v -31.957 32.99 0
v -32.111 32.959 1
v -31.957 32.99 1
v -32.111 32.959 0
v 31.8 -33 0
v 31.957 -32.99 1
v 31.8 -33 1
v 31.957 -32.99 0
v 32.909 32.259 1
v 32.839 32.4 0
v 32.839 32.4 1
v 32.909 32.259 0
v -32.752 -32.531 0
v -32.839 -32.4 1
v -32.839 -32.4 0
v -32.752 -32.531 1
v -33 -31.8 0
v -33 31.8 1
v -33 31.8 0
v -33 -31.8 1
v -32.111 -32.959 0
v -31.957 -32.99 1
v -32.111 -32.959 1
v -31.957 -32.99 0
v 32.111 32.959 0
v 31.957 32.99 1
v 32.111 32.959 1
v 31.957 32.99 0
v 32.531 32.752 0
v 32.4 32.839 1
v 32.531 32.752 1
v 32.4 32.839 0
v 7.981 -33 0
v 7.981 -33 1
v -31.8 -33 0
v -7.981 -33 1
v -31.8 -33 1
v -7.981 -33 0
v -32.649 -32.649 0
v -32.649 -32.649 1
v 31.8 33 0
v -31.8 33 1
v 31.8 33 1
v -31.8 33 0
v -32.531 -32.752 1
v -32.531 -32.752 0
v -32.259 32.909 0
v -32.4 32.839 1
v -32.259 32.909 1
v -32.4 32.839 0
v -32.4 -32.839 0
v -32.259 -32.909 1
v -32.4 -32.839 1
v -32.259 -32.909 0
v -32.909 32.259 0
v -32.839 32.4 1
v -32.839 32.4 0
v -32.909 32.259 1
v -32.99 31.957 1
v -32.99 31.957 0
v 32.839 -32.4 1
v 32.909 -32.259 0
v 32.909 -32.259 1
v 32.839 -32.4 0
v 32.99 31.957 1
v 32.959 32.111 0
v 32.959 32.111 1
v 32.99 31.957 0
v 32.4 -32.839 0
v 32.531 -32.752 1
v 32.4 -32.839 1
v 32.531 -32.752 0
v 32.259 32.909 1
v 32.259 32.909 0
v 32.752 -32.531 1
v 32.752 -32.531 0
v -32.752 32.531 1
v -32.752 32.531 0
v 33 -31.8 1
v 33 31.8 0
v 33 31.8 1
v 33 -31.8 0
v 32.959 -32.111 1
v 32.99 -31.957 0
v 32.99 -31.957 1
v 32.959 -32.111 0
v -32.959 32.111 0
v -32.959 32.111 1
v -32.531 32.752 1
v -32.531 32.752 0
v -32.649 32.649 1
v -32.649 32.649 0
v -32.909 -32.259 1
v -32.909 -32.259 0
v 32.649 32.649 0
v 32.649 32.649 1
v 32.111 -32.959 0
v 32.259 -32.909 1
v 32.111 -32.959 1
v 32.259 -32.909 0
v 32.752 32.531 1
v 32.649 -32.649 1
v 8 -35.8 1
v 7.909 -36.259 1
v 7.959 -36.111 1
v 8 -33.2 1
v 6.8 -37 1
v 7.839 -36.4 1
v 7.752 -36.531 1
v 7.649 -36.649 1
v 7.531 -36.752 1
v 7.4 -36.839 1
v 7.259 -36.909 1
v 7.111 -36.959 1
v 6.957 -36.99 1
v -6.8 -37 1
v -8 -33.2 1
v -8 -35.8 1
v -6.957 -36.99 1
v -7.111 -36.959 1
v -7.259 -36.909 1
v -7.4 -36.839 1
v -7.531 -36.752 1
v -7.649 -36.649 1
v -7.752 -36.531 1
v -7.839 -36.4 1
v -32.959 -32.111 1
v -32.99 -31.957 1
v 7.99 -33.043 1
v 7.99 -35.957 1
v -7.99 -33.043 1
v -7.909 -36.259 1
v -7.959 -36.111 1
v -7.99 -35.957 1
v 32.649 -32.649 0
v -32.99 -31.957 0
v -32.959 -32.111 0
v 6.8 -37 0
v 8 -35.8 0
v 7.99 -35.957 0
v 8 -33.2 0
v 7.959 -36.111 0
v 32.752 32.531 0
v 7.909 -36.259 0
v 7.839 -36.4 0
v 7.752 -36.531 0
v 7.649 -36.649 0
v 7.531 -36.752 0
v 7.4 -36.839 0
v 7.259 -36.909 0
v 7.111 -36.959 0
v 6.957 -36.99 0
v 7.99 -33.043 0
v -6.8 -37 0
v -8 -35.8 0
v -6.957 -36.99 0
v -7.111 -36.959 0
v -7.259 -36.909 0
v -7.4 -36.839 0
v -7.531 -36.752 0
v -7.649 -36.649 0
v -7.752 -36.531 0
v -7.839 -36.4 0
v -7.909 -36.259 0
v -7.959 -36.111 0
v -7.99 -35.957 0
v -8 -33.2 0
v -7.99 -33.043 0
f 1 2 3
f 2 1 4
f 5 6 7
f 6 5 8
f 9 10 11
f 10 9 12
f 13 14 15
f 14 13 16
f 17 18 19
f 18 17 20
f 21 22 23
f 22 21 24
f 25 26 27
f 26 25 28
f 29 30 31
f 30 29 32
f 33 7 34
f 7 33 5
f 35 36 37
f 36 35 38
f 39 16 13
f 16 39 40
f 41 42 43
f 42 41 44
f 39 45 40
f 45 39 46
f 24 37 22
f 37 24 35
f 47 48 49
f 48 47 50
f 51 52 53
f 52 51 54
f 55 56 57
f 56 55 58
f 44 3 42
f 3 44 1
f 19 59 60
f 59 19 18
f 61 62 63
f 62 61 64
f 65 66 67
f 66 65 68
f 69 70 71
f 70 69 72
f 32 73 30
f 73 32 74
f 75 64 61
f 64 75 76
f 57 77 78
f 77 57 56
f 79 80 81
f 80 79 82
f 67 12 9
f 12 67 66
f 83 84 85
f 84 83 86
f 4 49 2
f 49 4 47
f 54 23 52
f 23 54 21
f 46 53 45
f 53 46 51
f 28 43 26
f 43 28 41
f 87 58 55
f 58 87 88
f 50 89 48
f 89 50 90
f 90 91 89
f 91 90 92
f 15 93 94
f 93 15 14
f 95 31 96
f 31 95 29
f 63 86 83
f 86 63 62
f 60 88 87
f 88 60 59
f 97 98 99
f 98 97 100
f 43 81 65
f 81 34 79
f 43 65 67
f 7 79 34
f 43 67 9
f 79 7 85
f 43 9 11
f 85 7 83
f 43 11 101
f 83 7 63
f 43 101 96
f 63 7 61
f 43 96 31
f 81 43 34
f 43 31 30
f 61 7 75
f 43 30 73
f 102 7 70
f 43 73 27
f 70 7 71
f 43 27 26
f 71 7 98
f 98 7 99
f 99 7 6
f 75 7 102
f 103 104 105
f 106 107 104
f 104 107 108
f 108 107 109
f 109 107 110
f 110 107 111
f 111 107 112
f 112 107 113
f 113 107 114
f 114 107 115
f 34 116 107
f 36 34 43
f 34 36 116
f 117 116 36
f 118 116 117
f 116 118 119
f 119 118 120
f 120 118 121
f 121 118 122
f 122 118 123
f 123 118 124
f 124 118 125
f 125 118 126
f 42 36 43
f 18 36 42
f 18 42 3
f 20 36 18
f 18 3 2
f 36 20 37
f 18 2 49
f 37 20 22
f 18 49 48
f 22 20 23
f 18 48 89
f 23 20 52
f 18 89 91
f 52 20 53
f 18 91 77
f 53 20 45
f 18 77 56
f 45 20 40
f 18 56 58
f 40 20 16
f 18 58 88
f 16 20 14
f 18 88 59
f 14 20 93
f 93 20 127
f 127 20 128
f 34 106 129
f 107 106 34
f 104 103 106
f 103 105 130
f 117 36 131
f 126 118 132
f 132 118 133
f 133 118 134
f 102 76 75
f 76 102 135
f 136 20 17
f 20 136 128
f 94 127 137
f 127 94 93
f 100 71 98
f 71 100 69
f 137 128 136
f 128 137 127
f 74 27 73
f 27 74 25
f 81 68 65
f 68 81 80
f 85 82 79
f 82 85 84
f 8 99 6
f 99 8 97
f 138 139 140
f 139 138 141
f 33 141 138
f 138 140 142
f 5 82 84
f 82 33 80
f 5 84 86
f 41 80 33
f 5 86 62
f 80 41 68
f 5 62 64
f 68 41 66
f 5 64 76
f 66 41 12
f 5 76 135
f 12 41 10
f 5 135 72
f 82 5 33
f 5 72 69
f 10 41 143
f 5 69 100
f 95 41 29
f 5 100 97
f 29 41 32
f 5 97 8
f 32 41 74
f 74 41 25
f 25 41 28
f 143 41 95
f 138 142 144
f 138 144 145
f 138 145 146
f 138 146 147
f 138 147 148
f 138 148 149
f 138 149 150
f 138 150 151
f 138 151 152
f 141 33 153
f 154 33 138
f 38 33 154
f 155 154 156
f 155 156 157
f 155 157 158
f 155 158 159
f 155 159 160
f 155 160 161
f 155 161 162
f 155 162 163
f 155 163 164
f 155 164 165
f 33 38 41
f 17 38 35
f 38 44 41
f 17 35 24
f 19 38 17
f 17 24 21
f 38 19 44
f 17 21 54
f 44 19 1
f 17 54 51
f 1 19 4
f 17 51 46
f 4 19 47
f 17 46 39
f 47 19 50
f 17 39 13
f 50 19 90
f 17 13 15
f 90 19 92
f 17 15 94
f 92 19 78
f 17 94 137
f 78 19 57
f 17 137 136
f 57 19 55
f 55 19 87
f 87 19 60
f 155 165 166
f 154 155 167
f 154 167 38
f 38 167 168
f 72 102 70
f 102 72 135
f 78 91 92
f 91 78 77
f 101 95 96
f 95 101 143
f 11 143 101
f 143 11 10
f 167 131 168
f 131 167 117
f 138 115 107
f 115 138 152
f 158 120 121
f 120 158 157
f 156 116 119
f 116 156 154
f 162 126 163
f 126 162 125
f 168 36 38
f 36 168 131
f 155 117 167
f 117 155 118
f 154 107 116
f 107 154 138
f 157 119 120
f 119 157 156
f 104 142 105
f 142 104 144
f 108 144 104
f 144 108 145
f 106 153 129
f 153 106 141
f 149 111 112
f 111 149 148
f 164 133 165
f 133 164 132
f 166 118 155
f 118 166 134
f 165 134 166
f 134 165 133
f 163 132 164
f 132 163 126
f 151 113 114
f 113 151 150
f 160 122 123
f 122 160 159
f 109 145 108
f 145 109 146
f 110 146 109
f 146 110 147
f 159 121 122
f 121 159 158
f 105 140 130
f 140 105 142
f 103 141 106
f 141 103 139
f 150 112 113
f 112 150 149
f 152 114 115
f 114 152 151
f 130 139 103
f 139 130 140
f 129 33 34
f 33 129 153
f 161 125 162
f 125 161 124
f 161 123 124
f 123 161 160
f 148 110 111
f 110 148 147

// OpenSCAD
// file: rm_common.scad
// RobotMind Modular Ecosystem — common library
// Rev A concept for FDM prototyping, designed to migrate to injection molding.
$fn = 48;

// ---- Global mechanical interface ----
RM_DOCK_W = 30;
RM_DOCK_L = 34;
RM_DOCK_H = 5;
RM_RAIL_H = 2.6;
RM_RAIL_W = 3.2;
RM_RAIL_INSET = 3.8;
RM_CLEARANCE = 0.28;   // FDM sliding clearance per side
RM_LATCH_W = 7;
RM_LATCH_L = 9;
RM_LATCH_T = 1.6;
RM_LATCH_HOOK = 1.1;
RM_M3 = 3.3;

module rounded_box(size=[20,20,3], r=2, center=false) {
    x=size[0]; y=size[1]; z=size[2];
    translate(center ? [-x/2,-y/2,-z/2] : [0,0,0])
    linear_extrude(height=z)
      offset(r=r)
      offset(delta=-r)
      square([x,y]);
}

module slot2d(len=10, d=3) {
    hull(){
      translate([-len/2+d/2,0]) circle(d=d);
      translate([ len/2-d/2,0]) circle(d=d);
    }
}

// Male dovetail rail. The simplified trapezoid is robust in FDM and moldable.
module dovetail_rail(len=RM_DOCK_L-4, w=RM_RAIL_W, h=RM_RAIL_H) {
    linear_extrude(height=len)
      polygon(points=[[-w/2,0],[w/2,0],[w/2+1.0,h],[-w/2-1.0,h]]);
}

// Female channel cutter, slightly oversized.
module dovetail_channel(len=RM_DOCK_L, w=RM_RAIL_W+2*RM_CLEARANCE, h=RM_RAIL_H+RM_CLEARANCE) {
    linear_extrude(height=len)
      polygon(points=[[-w/2,0],[w/2,0],[w/2+1.15,h],[-w/2-1.15,h]]);
}

module male_interface() {
    // Interface origin centered X/Y, bottom at Z=0.
    for (sx=[-1,1])
      translate([sx*(RM_DOCK_W/2-RM_RAIL_INSET), -RM_DOCK_L/2+2, 0])
        rotate([-90,0,0]) dovetail_rail();
    // central catch boss engaged by dock latch
    translate([-RM_LATCH_W/2, RM_DOCK_L/2-7, 0])
      cube([RM_LATCH_W,4,1.25]);
}

module dock_body_base() {
    difference(){
      rounded_box([RM_DOCK_W,RM_DOCK_L,RM_DOCK_H],2.2,center=true);
      // open female dovetails from insertion side
      for (sx=[-1,1])
        translate([sx*(RM_DOCK_W/2-RM_RAIL_INSET), -RM_DOCK_L/2-0.2, -RM_DOCK_H/2+1.1])
          rotate([-90,0,0]) dovetail_channel(len=RM_DOCK_L+1);
      // four M3 mounting holes
      for(x=[-10.5,10.5], y=[-12,12]) translate([x,y,0]) cylinder(h=RM_DOCK_H+2,d=RM_M3,center=true);
      // latch relief window
      translate([-RM_LATCH_W/2-0.5, RM_DOCK_L/2-11, -RM_DOCK_H/2-0.1]) cube([RM_LATCH_W+1,11,RM_DOCK_H+1]);
    }
}

module latch_finger() {
    // flexible cantilever integrated at back of dock
    translate([-RM_LATCH_W/2, RM_DOCK_L/2-10, -RM_DOCK_H/2+0.7]) {
      cube([RM_LATCH_W,RM_LATCH_L,RM_LATCH_T]);
      translate([0,RM_LATCH_L-1.4,RM_LATCH_T]) cube([RM_LATCH_W,1.4,RM_LATCH_HOOK]);
      // thumb tab
      translate([-1.2,RM_LATCH_L-0.8,-0.2]) cube([RM_LATCH_W+2.4,3,RM_LATCH_T+0.4]);
    }
}

module universal_dock() {
    union(){ dock_body_base(); latch_finger(); }
}

module sensor_carrier(pcb=[20,20], wall=1.7, floor=1.8, clearance=0.5) {
    // carrier top tray centered; universal male interface below
    W=pcb[0]+2*(wall+clearance);
    L=pcb[1]+2*(wall+clearance);
    union(){
      translate([-W/2,-L/2,0]) difference(){
        rounded_box([W,L,floor+3.1],2);
        translate([wall,wall,floor]) rounded_box([pcb[0]+2*clearance,pcb[1]+2*clearance,5],1.0);
        // cable exit on front edge
        translate([W/2-6,-0.2,floor+0.5]) cube([12,wall+1,3.5]);
      }
      // small retention lips; gentle, printable snap
      for(x=[-W/2+2.2,W/2-2.2], y=[-L/2+2.2,L/2-2.2])
         translate([x,y,floor+2.5]) cylinder(h=1.3,d=2.2);
      translate([0,0,-RM_RAIL_H]) male_interface();
    }
}

module tag_insert(tag=[60,60], border=3.0, t=1.0, pulltab=true) {
    W=tag[0]+2*border; H=tag[1]+2*border;
    union(){
      translate([-W/2,-H/2,0]) rounded_box([W,H,t],1.2);
      if(pulltab) translate([-8,-H/2-4,0]) rounded_box([16,5,t],1.2);
    }
}

module tag_insert_rails(tag=[60,60], border=4, rail=1.5, depth=2.2) {
    W=tag[0]+2*border; H=tag[1]+2*border;
    // rails intended to capture tag insert edges
    for(sx=[-1,1]) translate([sx*(W/2-rail/2),0,0]) cube([rail,H,depth],center=true);
    translate([0,H/2-rail/2,0]) cube([W,rail,depth],center=true); // hard stop
}

module angle_wedge(angle=15, footprint=[RM_DOCK_W+4,RM_DOCK_L+4], min_h=3) {
    // solid wedge with top angled; child dock can be placed on top by caller
    W=footprint[0]; L=footprint[1]; dh=tan(angle)*L;
    polyhedron(points=[
      [-W/2,-L/2,0],[W/2,-L/2,0],[W/2,L/2,0],[-W/2,L/2,0],
      [-W/2,-L/2,min_h],[W/2,-L/2,min_h],[W/2,L/2,min_h+dh],[-W/2,L/2,min_h+dh]
    ], faces=[[0,1,2,3],[4,7,6,5],[0,4,5,1],[1,5,6,2],[2,6,7,3],[3,7,4,0]]);
}
// main file
include <rm_common.scad>
// Default 60 mm visible tag insert. Change TAG_SIZE to suit printed tag.
TAG_SIZE=60;
tag_insert([TAG_SIZE,TAG_SIZE], border=3, t=1.0);
